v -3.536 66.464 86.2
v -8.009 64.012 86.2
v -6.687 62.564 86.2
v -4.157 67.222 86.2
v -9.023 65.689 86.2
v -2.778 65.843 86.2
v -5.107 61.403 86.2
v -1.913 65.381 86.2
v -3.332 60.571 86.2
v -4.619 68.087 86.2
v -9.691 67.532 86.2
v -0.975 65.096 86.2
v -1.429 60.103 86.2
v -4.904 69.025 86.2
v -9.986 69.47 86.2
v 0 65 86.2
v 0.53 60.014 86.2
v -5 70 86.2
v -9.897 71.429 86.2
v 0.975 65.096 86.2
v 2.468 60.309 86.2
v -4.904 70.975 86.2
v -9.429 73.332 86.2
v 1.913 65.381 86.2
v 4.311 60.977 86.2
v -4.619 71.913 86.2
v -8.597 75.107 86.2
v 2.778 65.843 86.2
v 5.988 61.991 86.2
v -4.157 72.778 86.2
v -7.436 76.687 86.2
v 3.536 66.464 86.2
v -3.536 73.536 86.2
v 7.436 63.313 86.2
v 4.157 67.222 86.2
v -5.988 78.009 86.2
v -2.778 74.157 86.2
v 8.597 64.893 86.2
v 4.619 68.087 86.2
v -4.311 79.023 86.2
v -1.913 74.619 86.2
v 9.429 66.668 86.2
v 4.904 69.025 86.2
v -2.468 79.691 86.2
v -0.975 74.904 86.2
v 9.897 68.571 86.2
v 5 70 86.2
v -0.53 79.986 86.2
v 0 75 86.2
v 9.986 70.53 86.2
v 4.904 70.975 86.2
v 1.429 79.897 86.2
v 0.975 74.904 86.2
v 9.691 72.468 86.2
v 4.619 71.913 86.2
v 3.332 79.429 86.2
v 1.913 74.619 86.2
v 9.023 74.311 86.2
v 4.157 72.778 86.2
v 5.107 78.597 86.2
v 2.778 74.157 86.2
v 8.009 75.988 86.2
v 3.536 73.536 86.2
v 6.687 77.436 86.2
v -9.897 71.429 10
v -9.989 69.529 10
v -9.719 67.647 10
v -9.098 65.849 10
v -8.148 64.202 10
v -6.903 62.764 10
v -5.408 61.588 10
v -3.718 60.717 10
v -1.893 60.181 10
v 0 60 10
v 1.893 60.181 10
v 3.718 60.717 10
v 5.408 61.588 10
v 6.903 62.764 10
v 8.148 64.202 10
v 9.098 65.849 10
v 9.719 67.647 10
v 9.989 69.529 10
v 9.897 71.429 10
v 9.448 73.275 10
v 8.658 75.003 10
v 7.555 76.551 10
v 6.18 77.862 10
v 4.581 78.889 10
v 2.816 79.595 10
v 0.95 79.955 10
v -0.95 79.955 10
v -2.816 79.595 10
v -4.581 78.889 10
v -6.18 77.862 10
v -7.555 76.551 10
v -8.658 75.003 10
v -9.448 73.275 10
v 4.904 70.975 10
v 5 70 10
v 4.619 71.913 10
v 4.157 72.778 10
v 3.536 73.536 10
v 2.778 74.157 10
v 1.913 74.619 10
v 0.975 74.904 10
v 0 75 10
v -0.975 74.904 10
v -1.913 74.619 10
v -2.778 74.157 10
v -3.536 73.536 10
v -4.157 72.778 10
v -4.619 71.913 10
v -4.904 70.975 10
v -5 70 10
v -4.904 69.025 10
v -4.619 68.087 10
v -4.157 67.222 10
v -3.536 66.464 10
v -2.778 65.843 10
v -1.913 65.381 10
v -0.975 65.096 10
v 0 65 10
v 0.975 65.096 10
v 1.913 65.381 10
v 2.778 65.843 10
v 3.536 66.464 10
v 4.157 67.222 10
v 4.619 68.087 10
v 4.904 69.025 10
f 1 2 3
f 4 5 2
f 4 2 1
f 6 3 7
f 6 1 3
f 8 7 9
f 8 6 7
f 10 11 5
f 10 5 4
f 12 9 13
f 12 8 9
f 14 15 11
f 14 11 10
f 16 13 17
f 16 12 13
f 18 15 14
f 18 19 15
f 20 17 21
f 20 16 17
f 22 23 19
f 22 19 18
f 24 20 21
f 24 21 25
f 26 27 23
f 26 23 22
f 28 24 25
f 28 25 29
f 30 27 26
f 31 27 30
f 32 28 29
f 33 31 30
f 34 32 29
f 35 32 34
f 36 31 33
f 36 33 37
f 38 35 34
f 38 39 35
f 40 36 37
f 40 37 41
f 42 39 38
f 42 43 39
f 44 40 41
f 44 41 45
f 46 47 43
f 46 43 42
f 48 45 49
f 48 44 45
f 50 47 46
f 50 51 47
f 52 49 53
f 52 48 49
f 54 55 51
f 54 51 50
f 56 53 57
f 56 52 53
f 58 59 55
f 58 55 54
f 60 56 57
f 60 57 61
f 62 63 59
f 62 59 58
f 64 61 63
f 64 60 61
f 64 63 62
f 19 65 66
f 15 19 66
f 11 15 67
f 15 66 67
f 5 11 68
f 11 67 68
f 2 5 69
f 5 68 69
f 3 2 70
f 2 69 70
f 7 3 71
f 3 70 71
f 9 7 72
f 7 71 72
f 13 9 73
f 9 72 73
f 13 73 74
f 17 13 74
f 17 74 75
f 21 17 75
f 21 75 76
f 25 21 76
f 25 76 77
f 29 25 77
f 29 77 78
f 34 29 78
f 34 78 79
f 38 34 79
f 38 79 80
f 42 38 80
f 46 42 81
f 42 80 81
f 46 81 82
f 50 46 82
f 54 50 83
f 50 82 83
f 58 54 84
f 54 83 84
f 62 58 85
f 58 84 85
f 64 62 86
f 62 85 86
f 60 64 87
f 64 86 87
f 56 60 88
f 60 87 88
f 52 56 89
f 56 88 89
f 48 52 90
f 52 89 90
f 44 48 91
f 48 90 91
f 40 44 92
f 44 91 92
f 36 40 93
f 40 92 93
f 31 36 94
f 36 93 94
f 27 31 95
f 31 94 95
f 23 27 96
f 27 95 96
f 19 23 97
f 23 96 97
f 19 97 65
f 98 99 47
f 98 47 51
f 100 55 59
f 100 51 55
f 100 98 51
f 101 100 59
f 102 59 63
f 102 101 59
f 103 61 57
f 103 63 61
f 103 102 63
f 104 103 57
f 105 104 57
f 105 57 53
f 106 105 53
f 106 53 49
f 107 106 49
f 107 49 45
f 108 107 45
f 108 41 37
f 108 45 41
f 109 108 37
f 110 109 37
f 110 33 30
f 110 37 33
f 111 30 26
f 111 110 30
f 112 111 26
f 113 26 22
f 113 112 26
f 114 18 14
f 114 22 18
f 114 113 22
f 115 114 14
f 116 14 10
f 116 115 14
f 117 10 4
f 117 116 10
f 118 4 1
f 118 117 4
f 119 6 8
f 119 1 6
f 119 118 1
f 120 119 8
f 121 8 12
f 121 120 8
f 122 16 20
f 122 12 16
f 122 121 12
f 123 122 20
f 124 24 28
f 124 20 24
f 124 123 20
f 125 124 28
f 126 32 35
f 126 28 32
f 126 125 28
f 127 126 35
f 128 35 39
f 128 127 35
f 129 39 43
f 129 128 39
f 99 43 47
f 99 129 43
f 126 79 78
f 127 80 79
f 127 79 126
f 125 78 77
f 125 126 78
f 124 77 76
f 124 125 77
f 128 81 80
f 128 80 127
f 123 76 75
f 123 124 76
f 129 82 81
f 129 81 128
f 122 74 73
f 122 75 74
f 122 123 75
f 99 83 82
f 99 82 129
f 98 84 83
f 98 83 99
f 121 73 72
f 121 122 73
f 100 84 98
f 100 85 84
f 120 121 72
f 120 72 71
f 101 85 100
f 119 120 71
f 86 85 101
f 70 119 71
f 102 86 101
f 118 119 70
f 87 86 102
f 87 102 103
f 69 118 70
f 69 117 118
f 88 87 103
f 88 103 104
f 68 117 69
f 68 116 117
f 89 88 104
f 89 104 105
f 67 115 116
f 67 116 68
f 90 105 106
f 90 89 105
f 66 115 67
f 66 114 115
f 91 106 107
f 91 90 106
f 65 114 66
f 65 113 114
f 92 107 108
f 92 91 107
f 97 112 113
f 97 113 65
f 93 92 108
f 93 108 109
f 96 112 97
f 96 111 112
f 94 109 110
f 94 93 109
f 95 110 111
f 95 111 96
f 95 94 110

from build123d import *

# Parameters (mm, degrees)
SKETCH2_R           = 5
BOSS_EXTRUDE1_DEPTH = 10
SKETCH3_R           = 10
SKETCH3_R_2         = 5
BOSS_EXTRUDE2_DEPTH = 76.2
BOSS_EXTRUDE3_START = 86.2
SKETCH2_2_R         = 5
BOSS_EXTRUDE3_DEPTH = 22
SKETCH5_R           = 65
BOSS_EXTRUDE4_DEPTH = 22
SKETCH6_R           = 55
CUT_EXTRUDE1_DEPTH  = 22
SKETCH7_R           = 80
CUT_EXTRUDE2_DEPTH  = 22
SKETCH8_R           = 80
CUT_EXTRUDE3_DEPTH  = 10


with BuildPart() as part:
    # Sketch2 → Boss-Extrude1 (new body)
    with BuildSketch(Plane.XY):
        with BuildLine():
            Line((-19.794866372, 2.857142857), (-9.897433186, 71.428571429))
            ThreePointArc((-9.897433186, 71.428571429), (0, 80), (9.897433186, 71.428571429))
            Line((9.897433186, 71.428571429), (19.794866372, 2.857142857))
            ThreePointArc((19.794866372, 2.857142857), (0, -20), (-19.794866372, 2.857142857))
        make_face()
        with Locations((0, 70)):
            Circle(SKETCH2_R, mode=Mode.SUBTRACT)
        with BuildLine():
            Line((-2.5, 9.682458366), (-2.5, 12))
            Line((-2.5, 12), (2.5, 12))
            Line((2.5, 12), (2.5, 9.682458366))
            ThreePointArc((2.5, 9.682458366), (0, -10), (-2.5, 9.682458366))
        make_face(mode=Mode.SUBTRACT)
    extrude(amount=BOSS_EXTRUDE1_DEPTH)

    # Sketch3 → Boss-Extrude2 (add)
    with BuildSketch(Plane.XY.offset(10)):
        with Locations(Location((0, 70, 0), (0, 0, 171.786789298))):
            Circle(SKETCH3_R)
        with Locations((0, 70)):
            Circle(SKETCH3_R_2, mode=Mode.SUBTRACT)
    extrude(amount=BOSS_EXTRUDE2_DEPTH)

    # Sketch2<2> → Boss-Extrude3 (add)
    with BuildSketch(Plane.XY.offset(BOSS_EXTRUDE3_START)):
        with BuildLine():
            Line((-19.794866372, 2.857142857), (-9.897433186, 71.428571429))
            ThreePointArc((-9.897433186, 71.428571429), (0, 80), (9.897433186, 71.428571429))
            Line((9.897433186, 71.428571429), (19.794866372, 2.857142857))
            ThreePointArc((19.794866372, 2.857142857), (0, -20), (-19.794866372, 2.857142857))
        make_face()
        with Locations((0, 70)):
            Circle(SKETCH2_2_R, mode=Mode.SUBTRACT)
        with BuildLine():
            Line((-2.5, 9.682458366), (-2.5, 12))
            Line((-2.5, 12), (2.5, 12))
            Line((2.5, 12), (2.5, 9.682458366))
            ThreePointArc((2.5, 9.682458366), (0, -10), (-2.5, 9.682458366))
        make_face(mode=Mode.SUBTRACT)
    extrude(amount=BOSS_EXTRUDE3_DEPTH)

    # Sketch5 → Boss-Extrude4 (add)
    with BuildSketch(Plane.XY.offset(108.2)):
        Circle(SKETCH5_R)
    extrude(amount=-BOSS_EXTRUDE4_DEPTH)

    # Sketch6 → Cut-Extrude1 (cut)
    with BuildSketch(Plane.XY.offset(108.2)):
        Circle(SKETCH6_R)
    extrude(amount=-CUT_EXTRUDE1_DEPTH, mode=Mode.SUBTRACT)

    # Sketch7 → Cut-Extrude2 (cut)
    with BuildSketch(Plane.XY.offset(108.2)):
        Circle(SKETCH7_R)
    extrude(amount=-CUT_EXTRUDE2_DEPTH, mode=Mode.SUBTRACT)

    # Sketch8 → Cut-Extrude3 (cut)
    with BuildSketch(Plane(origin=(0, 0, 0), x_dir=(-1, 0, 0), z_dir=(0, 0, -1))):
        Circle(SKETCH8_R)
    extrude(amount=-CUT_EXTRUDE3_DEPTH, mode=Mode.SUBTRACT)


solid = part.part
